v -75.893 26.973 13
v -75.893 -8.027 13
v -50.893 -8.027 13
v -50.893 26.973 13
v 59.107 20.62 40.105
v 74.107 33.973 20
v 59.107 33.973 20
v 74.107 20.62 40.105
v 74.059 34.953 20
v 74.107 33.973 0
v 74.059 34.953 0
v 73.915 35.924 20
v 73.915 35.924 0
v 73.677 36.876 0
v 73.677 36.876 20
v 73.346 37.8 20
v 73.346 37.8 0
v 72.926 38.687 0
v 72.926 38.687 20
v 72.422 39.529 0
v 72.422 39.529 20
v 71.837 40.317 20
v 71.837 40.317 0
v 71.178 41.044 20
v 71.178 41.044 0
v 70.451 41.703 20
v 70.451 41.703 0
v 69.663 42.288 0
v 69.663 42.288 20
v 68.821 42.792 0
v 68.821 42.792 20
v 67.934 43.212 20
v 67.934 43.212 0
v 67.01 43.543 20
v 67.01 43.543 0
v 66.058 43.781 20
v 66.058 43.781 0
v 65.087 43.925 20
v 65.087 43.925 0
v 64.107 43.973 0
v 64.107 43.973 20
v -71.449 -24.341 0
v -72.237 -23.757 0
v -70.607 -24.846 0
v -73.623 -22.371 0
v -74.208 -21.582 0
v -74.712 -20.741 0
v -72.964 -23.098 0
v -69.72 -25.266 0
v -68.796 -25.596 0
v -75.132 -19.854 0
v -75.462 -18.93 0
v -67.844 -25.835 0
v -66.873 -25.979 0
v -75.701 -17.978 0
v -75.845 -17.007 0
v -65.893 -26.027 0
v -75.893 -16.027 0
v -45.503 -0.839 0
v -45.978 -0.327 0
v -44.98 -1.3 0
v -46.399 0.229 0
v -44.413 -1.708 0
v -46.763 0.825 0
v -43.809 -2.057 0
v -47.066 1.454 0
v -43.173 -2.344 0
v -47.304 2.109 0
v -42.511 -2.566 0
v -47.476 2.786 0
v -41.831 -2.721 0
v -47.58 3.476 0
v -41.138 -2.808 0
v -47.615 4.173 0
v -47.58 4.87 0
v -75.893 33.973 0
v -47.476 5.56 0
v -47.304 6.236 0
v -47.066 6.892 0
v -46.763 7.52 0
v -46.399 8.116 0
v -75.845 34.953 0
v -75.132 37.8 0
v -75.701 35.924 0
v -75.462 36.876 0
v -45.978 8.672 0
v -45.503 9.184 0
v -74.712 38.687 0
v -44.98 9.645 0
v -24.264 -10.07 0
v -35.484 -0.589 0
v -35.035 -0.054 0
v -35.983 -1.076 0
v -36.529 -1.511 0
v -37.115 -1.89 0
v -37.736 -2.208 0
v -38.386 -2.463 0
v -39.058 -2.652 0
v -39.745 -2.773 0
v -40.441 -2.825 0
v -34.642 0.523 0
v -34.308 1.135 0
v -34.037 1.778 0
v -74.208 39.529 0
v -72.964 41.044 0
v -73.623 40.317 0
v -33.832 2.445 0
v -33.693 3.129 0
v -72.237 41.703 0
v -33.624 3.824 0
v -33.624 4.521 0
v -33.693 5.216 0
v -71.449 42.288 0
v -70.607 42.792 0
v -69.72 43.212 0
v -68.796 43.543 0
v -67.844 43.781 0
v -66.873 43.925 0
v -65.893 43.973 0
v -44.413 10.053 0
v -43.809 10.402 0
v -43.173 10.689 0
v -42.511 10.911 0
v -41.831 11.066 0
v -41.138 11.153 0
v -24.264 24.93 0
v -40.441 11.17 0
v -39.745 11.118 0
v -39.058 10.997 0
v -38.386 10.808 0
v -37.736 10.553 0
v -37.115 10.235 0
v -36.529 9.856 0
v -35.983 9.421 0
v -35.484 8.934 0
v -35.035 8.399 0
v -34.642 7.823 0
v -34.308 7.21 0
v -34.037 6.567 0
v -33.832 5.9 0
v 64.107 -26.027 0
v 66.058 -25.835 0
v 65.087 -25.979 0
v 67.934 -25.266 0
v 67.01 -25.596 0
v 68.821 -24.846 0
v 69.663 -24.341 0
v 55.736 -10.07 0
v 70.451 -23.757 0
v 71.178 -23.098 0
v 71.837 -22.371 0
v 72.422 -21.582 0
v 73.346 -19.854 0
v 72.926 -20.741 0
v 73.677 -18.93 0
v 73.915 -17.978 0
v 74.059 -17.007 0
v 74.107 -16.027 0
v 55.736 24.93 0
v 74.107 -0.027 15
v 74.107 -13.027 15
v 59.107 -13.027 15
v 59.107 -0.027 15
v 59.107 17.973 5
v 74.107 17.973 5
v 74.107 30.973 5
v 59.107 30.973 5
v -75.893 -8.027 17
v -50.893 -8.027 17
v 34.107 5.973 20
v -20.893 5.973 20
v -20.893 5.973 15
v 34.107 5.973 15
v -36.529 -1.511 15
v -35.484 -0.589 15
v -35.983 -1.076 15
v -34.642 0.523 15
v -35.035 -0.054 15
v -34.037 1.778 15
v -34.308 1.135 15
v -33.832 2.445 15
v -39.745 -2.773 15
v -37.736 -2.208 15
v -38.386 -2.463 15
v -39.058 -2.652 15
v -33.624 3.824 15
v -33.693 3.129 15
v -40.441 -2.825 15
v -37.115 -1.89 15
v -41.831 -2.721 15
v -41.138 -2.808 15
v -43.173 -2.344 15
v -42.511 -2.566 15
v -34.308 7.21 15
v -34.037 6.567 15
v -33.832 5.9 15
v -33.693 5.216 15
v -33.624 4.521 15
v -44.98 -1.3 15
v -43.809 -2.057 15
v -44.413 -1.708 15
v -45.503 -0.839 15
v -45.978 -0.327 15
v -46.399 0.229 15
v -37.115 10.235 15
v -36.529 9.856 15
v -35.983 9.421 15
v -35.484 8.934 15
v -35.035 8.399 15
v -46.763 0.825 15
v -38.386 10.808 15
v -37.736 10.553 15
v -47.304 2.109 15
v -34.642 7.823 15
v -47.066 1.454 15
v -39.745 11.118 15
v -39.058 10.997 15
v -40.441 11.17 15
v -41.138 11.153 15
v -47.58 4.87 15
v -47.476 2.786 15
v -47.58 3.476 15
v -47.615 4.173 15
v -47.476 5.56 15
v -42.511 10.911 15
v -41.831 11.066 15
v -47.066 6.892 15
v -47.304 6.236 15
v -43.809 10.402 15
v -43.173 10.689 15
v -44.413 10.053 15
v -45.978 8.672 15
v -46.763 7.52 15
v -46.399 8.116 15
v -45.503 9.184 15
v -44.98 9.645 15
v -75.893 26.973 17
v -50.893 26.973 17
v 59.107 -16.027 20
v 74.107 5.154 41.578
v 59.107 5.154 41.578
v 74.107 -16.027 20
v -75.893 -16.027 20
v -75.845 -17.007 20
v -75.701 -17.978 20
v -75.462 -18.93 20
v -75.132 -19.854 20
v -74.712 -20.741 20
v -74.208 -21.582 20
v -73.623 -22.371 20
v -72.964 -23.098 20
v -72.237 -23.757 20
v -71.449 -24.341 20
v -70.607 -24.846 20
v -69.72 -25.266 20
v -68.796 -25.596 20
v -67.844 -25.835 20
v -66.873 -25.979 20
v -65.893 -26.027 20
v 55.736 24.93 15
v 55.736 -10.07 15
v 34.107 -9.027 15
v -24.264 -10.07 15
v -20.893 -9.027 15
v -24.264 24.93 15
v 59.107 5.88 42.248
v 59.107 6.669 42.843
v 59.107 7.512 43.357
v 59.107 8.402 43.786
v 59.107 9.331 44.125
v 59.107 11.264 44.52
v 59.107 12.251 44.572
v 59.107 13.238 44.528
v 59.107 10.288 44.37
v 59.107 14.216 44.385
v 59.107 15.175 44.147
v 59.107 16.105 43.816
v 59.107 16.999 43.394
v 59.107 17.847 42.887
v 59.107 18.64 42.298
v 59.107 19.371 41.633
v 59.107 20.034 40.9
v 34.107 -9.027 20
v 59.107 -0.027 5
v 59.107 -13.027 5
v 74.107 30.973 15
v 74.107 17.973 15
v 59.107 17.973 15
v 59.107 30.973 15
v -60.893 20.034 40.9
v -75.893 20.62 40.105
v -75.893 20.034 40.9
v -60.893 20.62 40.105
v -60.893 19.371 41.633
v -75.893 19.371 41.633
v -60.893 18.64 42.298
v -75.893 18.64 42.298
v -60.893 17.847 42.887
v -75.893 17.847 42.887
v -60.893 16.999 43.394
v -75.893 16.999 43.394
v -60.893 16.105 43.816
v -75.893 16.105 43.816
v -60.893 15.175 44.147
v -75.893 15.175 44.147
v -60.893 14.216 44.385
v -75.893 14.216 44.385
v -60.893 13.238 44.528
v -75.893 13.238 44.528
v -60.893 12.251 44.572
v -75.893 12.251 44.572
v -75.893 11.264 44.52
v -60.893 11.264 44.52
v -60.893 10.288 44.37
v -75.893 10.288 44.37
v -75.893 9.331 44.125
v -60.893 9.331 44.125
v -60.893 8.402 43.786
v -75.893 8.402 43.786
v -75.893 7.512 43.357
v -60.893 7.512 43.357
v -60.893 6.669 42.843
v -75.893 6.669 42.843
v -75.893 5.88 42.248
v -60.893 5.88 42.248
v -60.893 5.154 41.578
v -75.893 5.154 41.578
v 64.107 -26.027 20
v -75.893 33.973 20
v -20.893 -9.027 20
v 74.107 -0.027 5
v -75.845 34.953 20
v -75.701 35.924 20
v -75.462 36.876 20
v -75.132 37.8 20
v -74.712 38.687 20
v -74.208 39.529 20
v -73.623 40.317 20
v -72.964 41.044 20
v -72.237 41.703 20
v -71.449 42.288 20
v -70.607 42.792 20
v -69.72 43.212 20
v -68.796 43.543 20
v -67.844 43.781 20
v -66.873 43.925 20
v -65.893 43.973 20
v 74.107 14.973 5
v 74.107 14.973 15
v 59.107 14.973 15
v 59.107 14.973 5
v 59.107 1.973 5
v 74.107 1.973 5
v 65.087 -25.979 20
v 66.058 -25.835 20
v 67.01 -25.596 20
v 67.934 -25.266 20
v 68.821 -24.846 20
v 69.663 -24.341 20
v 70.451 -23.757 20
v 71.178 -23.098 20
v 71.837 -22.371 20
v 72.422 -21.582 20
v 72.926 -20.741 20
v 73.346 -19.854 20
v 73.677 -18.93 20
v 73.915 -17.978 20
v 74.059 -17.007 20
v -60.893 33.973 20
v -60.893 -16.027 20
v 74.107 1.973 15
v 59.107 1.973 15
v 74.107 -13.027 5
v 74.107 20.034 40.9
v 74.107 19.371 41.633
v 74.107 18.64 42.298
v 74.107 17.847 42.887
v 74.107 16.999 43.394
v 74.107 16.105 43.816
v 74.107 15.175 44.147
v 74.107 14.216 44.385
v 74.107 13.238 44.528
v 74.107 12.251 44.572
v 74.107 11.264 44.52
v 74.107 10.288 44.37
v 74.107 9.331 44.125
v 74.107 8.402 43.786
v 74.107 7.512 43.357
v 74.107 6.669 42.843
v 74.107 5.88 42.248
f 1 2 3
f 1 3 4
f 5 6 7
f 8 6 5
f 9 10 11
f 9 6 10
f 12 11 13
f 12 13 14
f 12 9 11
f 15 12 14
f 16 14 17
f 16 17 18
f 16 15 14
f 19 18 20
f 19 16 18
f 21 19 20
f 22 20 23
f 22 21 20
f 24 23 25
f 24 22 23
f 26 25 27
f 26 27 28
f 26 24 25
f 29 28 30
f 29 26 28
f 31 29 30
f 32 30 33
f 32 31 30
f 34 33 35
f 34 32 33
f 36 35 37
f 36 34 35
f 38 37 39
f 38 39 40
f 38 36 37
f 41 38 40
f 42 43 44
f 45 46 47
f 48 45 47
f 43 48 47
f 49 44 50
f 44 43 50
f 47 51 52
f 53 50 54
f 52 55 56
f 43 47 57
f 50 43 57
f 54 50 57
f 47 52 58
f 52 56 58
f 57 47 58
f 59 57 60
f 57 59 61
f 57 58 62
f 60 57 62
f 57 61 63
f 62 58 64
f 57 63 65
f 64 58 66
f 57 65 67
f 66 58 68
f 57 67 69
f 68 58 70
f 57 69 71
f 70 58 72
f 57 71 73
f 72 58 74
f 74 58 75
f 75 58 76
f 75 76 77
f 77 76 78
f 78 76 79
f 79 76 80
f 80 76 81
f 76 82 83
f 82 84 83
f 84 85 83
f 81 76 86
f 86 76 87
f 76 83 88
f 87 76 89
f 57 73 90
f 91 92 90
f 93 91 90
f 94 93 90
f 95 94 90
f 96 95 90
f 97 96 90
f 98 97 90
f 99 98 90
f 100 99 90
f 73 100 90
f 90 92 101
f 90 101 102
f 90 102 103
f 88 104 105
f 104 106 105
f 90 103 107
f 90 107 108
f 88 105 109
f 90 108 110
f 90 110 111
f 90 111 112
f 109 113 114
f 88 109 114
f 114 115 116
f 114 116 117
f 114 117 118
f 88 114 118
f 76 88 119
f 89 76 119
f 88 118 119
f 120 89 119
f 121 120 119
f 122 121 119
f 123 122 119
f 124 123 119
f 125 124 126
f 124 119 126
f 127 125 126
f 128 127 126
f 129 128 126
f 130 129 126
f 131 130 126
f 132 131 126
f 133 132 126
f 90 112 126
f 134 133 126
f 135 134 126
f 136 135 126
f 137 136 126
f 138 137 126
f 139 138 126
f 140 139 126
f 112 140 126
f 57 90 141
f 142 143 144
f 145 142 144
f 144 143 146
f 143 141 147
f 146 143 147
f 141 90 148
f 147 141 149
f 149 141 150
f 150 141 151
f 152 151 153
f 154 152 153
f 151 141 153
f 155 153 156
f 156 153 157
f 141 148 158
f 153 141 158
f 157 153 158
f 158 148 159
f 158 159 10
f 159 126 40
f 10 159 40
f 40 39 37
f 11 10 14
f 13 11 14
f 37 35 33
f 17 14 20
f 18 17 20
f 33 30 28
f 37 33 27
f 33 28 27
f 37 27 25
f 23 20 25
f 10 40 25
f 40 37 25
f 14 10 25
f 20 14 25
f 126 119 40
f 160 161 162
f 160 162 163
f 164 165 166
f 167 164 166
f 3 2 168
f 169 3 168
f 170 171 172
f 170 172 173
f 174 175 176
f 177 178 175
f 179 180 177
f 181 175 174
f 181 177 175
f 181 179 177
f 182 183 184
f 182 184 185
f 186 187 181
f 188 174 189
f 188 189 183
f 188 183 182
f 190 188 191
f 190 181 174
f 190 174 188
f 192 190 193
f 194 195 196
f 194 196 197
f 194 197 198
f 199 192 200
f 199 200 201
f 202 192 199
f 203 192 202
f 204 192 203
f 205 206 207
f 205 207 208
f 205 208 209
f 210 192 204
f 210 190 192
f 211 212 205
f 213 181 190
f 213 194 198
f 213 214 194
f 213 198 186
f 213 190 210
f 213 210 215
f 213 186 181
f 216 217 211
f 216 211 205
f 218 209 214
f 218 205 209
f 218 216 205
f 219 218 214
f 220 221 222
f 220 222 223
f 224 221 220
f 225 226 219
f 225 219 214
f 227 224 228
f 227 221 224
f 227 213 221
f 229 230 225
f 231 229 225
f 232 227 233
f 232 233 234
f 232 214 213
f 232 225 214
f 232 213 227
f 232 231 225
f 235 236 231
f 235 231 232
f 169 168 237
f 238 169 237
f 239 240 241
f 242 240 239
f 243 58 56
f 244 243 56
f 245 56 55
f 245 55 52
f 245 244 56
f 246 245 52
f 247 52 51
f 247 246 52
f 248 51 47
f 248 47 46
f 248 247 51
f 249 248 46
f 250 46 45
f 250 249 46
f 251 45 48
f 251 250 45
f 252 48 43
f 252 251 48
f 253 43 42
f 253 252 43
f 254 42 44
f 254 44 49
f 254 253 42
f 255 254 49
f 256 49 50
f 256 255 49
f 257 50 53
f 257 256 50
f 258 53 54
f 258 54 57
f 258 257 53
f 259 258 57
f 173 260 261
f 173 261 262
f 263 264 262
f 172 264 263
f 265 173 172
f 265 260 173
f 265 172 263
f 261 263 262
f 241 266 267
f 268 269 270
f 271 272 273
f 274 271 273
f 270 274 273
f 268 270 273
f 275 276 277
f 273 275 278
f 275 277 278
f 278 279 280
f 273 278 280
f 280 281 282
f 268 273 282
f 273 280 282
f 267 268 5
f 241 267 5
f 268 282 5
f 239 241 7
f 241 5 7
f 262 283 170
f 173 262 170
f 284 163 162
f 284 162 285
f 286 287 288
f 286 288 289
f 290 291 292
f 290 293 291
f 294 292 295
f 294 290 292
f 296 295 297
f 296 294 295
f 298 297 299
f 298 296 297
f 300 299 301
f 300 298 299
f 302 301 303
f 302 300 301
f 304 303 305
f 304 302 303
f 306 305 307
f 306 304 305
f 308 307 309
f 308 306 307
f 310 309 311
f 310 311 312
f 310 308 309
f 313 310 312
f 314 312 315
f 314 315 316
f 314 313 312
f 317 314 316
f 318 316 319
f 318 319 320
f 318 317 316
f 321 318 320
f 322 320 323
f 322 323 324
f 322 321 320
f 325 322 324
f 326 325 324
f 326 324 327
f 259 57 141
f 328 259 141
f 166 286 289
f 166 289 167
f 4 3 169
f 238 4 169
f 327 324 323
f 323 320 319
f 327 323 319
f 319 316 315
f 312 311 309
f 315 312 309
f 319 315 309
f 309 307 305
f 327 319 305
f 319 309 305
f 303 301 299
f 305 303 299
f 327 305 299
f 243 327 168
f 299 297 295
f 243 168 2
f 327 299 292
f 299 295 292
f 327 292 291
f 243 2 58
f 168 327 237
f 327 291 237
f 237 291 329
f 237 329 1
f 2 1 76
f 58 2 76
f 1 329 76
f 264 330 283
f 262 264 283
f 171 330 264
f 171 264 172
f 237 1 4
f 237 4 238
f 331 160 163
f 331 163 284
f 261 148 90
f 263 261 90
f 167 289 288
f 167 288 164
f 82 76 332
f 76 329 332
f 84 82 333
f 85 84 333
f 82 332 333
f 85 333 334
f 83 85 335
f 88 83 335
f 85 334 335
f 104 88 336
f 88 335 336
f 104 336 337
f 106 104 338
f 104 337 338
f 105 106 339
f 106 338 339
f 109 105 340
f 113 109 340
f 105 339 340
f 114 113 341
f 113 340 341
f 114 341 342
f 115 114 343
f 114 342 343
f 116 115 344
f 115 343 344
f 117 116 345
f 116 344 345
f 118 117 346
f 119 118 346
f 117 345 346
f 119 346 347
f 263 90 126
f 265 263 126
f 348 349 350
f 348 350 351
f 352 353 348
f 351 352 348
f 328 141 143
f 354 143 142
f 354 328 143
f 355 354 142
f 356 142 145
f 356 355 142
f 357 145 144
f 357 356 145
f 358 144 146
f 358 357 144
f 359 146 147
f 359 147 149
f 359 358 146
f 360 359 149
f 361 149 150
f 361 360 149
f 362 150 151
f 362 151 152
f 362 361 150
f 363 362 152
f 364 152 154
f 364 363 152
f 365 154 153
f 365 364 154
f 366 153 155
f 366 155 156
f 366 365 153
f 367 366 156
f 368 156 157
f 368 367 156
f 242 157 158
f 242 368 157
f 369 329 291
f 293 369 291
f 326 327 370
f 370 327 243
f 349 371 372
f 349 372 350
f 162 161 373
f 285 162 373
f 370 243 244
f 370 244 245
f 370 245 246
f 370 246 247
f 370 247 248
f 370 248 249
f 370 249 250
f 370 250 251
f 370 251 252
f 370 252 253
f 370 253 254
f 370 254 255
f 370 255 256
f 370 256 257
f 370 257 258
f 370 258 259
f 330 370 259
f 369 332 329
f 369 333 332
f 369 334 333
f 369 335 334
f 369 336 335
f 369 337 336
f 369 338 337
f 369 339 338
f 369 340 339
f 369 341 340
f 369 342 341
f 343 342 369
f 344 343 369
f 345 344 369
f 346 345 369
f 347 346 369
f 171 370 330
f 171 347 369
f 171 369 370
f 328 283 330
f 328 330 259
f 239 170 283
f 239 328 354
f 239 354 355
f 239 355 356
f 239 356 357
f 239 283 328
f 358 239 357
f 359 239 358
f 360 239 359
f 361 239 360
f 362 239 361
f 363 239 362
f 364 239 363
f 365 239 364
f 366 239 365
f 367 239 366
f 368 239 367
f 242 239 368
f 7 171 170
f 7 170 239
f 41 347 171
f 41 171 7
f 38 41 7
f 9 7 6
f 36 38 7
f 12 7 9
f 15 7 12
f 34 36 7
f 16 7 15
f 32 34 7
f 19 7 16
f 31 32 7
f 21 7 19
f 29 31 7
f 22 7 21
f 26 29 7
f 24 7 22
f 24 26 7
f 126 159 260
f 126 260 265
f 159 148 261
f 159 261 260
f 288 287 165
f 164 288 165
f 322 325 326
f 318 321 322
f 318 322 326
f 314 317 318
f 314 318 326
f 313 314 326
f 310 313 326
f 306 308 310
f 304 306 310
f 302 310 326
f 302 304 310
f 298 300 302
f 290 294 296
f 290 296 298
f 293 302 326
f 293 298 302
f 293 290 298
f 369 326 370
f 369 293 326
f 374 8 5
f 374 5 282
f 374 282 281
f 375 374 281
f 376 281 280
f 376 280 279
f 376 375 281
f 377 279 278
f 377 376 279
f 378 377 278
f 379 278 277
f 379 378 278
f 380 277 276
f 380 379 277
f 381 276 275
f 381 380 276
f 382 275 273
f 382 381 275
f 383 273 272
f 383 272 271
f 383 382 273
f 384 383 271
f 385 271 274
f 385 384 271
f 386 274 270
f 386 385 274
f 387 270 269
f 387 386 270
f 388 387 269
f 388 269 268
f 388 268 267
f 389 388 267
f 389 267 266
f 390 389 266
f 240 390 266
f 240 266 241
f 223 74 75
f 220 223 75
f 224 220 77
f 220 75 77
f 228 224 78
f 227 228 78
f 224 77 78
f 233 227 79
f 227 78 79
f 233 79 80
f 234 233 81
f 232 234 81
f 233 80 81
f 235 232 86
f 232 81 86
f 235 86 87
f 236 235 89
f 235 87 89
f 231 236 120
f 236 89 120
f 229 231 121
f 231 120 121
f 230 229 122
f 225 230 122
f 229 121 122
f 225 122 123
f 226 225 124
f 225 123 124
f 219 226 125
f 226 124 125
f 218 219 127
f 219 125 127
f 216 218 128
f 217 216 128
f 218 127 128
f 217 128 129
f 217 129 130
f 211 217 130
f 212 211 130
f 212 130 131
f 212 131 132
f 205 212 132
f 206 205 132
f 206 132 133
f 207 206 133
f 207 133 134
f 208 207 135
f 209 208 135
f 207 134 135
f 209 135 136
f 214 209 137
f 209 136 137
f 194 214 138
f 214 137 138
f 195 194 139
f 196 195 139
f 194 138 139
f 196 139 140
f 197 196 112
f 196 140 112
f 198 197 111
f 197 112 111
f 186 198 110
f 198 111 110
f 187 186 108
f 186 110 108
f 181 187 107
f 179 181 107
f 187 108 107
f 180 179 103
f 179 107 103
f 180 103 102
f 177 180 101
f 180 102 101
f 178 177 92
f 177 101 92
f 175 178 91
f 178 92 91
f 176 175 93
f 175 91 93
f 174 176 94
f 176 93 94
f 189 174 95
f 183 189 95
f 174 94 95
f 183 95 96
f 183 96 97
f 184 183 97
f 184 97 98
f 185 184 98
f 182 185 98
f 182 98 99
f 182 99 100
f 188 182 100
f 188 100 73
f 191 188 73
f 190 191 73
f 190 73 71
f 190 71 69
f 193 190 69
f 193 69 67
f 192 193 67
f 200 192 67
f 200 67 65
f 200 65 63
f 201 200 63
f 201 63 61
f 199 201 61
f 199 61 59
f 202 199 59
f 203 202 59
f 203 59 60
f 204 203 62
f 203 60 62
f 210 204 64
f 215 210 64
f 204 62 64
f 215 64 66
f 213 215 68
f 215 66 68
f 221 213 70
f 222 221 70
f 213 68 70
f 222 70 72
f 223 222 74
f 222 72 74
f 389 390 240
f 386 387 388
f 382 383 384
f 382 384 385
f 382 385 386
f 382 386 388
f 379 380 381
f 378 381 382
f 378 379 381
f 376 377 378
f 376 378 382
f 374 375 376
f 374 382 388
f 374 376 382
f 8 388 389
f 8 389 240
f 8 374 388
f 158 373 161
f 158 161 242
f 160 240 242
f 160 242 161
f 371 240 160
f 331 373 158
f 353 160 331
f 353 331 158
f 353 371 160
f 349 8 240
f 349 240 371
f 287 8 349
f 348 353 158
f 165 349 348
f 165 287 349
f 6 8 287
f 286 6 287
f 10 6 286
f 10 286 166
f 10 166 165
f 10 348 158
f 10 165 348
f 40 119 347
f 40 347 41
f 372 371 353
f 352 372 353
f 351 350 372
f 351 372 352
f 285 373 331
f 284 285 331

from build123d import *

# Parameters (mm, degrees)
SKETCH1_W           = 150
SKETCH1_H           = 70
BOSS_EXTRUDE1_DEPTH = 20
FILLET1_R           = 10
SKETCH2_W           = 80
SKETCH2_H           = 35
CUT_EXTRUDE1_DEPTH  = 15
SKETCH3_R           = 7
CUT_EXTRUDE2_DEPTH  = 15
SKETCH4_W           = 10
SKETCH4_H           = 13
CUT_EXTRUDE3_DEPTH  = 15
SKETCH6_W           = 4
SKETCH6_H           = 35
CUT_EXTRUDE4_DEPTH  = 25
SKETCH7_W           = 55
SKETCH7_H           = 15
CUT_EXTRUDE5_DEPTH  = 5
BOSS_EXTRUDE3_DEPTH = 15
FILLET2_R           = 10
BOSS_EXTRUDE4_DEPTH = 15


with BuildPart() as part:
    # Sketch1 → Boss-Extrude1 (new body)
    with BuildSketch(Plane.XY):
        with Locations((-0.892857143, 8.973214286)):
            Rectangle(SKETCH1_W, SKETCH1_H)
    extrude(amount=BOSS_EXTRUDE1_DEPTH)

    # Fillet1
    fillet1_edges = [part.edges().sort_by_distance(p)[0] for p in [
        (-75.892857143, 43.973214286, 10),
        (-75.892857143, -26.026785714, 10),
        (74.107142857, -26.026785714, 10),
        (74.107142857, 43.973214286, 10),
    ]]
    fillet(fillet1_edges, radius=FILLET1_R)

    # Sketch2 → Cut-Extrude1 (cut)
    with BuildSketch(Plane(origin=(0, 0, 0), x_dir=(-1, 0, 0), z_dir=(0, 0, -1))):
        with Locations((-15.735916011, 7.430050789)):
            Rectangle(SKETCH2_W, SKETCH2_H)
    extrude(amount=-CUT_EXTRUDE1_DEPTH, mode=Mode.SUBTRACT)

    # Sketch3 → Cut-Extrude2 (cut)
    with BuildSketch(Plane(origin=(0, 0, 0), x_dir=(-1, 0, 0), z_dir=(0, 0, -1))):
        with Locations((40.615191865, 4.17256305)):
            Circle(SKETCH3_R)
    extrude(amount=-CUT_EXTRUDE2_DEPTH, mode=Mode.SUBTRACT)

    # Sketch4 → Cut-Extrude3 (cut)
    with BuildSketch(Plane(origin=(74.107142857, 0, 0), x_dir=(0, 0, -1), z_dir=(1, 0, 0))):
        with Locations((-10, 24.473214286)):
            Rectangle(SKETCH4_W, SKETCH4_H)
        with Locations((-10, 8.473214286)):
            Rectangle(SKETCH4_W, SKETCH4_H)
        with Locations((-10, -6.526785714)):
            Rectangle(SKETCH4_W, SKETCH4_H)
    extrude(amount=-CUT_EXTRUDE3_DEPTH, mode=Mode.SUBTRACT)

    # Sketch6 → Cut-Extrude4 (cut)
    with BuildSketch(Plane.ZY.offset(75.892857143)):
        with Locations((15, 9.473214286)):
            Rectangle(SKETCH6_W, SKETCH6_H)
    extrude(amount=-CUT_EXTRUDE4_DEPTH, mode=Mode.SUBTRACT)

    # Sketch7 → Cut-Extrude5 (cut)
    with BuildSketch(Plane.XY.offset(20)):
        with Locations((6.607142857, -1.526785714)):
            Rectangle(SKETCH7_W, SKETCH7_H)
    extrude(amount=-CUT_EXTRUDE5_DEPTH, mode=Mode.SUBTRACT)

    # Sketch9 → Boss-Extrude3 (add)
    with BuildSketch(Plane.ZY.offset(75.892857143)):
        Polygon((20, 33.973214286), (50.38122201, 13.795245322), (20, -16.026785714), align=None)
    extrude(amount=-BOSS_EXTRUDE3_DEPTH)

    # Fillet2
    fillet2_edges = [part.edges().sort_by_distance(p)[0] for p in [
        (-68.392857143, 13.795245322, 50.38122201),
    ]]
    fillet(fillet2_edges, radius=FILLET2_R)

    # Sketch11 → Boss-Extrude4 (add)
    with BuildSketch(Plane(origin=(74.107142857, 0, 0), x_dir=(0, 0, -1), z_dir=(1, 0, 0))):
        with BuildLine():
            Line((-20, 33.973214286), (-40.105065579, 20.620249447))
            ThreePointArc((-40.105065579, 20.620249447), (-44.527514661, 13.237920805), (-41.577619266, 5.15368001))
            Line((-41.577619266, 5.15368001), (-20, -16.026785714))
            Line((-20, -16.026785714), (-20, 33.973214286))
        make_face()
    extrude(amount=-BOSS_EXTRUDE4_DEPTH)


solid = part.part
